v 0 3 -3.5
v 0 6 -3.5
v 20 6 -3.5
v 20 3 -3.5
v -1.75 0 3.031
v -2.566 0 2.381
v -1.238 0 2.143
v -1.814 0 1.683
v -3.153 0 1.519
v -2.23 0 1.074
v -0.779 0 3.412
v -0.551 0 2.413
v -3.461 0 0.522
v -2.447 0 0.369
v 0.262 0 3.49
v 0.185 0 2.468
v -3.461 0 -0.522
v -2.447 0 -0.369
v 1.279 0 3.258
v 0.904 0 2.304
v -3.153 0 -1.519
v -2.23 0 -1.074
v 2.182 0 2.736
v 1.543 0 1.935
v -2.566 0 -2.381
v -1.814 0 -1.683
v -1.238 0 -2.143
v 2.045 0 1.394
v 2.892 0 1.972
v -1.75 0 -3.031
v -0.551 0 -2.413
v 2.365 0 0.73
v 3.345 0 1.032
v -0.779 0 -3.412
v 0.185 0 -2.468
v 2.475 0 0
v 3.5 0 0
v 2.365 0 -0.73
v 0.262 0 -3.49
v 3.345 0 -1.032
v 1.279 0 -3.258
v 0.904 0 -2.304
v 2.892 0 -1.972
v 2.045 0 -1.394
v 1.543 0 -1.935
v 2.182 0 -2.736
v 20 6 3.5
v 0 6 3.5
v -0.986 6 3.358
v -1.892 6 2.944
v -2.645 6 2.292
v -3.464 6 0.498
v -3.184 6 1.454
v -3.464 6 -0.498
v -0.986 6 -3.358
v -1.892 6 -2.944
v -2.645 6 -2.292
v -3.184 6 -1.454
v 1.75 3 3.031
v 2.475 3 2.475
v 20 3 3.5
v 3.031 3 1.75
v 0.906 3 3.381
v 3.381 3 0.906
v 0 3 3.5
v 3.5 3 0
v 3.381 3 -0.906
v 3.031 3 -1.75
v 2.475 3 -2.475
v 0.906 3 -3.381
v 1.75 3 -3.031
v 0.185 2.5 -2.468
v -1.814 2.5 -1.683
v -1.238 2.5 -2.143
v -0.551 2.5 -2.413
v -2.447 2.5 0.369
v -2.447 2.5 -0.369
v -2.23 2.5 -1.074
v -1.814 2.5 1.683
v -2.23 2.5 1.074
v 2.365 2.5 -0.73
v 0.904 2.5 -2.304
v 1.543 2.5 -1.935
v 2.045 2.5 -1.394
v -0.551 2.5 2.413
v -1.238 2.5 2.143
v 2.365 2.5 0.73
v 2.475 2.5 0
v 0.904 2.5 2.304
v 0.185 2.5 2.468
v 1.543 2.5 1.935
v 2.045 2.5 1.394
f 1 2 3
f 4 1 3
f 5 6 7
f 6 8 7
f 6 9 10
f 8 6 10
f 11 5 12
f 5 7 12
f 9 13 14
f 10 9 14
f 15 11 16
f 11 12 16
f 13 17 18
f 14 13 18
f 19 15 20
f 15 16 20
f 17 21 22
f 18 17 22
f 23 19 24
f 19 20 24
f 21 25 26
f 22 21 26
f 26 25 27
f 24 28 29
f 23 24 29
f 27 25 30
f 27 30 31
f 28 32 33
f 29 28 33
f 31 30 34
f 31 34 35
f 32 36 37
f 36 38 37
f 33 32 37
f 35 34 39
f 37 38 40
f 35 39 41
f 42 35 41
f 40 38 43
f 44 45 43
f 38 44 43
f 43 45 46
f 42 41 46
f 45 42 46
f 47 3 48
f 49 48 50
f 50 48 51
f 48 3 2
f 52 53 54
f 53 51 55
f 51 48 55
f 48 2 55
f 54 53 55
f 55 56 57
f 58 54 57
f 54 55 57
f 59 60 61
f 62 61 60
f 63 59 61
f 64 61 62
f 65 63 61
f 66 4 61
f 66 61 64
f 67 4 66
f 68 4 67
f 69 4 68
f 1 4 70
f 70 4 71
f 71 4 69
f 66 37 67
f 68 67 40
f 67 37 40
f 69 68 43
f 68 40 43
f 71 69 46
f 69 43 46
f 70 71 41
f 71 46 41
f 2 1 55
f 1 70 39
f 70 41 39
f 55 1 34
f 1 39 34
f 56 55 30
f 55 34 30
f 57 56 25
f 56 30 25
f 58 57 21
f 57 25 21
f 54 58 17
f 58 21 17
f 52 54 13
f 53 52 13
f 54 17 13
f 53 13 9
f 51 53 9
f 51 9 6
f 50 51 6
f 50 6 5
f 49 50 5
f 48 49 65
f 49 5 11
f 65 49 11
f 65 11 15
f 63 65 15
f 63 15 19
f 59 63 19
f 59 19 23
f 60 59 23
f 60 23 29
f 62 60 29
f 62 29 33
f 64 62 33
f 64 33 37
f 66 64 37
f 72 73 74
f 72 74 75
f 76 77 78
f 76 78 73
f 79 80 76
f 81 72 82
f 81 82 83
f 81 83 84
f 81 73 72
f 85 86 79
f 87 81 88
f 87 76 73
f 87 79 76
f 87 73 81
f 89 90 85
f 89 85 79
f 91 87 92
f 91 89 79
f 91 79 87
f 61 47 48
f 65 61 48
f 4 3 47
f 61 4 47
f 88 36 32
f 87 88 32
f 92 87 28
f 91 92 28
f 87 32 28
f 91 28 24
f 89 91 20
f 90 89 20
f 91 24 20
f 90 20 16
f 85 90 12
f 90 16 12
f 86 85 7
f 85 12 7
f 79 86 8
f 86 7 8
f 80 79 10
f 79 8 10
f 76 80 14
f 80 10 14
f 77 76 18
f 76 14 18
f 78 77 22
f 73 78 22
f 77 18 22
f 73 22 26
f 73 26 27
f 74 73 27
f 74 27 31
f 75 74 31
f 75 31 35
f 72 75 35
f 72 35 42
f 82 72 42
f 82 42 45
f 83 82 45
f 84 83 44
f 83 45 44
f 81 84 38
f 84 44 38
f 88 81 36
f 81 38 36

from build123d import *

# Parameters (mm, degrees)
SKETCH2_R           = 3.5
BOSS_EXTRUDE1_DEPTH = 6
SKETCH3_R           = 2.475
CUT_EXTRUDE1_DEPTH  = 2.5
BOSS_EXTRUDE2_DEPTH = 3


with BuildPart() as part:
    # Sketch2 → Boss-Extrude1 (new body)
    with BuildSketch(Plane(origin=(0, 0, 0), x_dir=(1, 0, 0), z_dir=(0, 1, 0))):
        Circle(SKETCH2_R)
    extrude(amount=BOSS_EXTRUDE1_DEPTH)

    # Sketch3 → Cut-Extrude1 (cut)
    with BuildSketch(Plane.XZ):
        Circle(SKETCH3_R)
    extrude(amount=-CUT_EXTRUDE1_DEPTH, mode=Mode.SUBTRACT)

    # Sketch4 → Boss-Extrude2 (add)
    with BuildSketch(Plane(origin=(0, 6, 0), x_dir=(1, 0, 0), z_dir=(0, 1, 0))):
        with BuildLine():
            Line((0, 3.5), (20, 3.5))
            Line((20, 3.5), (20, -3.5))
            Line((20, -3.5), (0, -3.5))
            ThreePointArc((0, -3.5), (3.5, 0), (0, 3.5))
        make_face()
    extrude(amount=-BOSS_EXTRUDE2_DEPTH)


solid = part.part
